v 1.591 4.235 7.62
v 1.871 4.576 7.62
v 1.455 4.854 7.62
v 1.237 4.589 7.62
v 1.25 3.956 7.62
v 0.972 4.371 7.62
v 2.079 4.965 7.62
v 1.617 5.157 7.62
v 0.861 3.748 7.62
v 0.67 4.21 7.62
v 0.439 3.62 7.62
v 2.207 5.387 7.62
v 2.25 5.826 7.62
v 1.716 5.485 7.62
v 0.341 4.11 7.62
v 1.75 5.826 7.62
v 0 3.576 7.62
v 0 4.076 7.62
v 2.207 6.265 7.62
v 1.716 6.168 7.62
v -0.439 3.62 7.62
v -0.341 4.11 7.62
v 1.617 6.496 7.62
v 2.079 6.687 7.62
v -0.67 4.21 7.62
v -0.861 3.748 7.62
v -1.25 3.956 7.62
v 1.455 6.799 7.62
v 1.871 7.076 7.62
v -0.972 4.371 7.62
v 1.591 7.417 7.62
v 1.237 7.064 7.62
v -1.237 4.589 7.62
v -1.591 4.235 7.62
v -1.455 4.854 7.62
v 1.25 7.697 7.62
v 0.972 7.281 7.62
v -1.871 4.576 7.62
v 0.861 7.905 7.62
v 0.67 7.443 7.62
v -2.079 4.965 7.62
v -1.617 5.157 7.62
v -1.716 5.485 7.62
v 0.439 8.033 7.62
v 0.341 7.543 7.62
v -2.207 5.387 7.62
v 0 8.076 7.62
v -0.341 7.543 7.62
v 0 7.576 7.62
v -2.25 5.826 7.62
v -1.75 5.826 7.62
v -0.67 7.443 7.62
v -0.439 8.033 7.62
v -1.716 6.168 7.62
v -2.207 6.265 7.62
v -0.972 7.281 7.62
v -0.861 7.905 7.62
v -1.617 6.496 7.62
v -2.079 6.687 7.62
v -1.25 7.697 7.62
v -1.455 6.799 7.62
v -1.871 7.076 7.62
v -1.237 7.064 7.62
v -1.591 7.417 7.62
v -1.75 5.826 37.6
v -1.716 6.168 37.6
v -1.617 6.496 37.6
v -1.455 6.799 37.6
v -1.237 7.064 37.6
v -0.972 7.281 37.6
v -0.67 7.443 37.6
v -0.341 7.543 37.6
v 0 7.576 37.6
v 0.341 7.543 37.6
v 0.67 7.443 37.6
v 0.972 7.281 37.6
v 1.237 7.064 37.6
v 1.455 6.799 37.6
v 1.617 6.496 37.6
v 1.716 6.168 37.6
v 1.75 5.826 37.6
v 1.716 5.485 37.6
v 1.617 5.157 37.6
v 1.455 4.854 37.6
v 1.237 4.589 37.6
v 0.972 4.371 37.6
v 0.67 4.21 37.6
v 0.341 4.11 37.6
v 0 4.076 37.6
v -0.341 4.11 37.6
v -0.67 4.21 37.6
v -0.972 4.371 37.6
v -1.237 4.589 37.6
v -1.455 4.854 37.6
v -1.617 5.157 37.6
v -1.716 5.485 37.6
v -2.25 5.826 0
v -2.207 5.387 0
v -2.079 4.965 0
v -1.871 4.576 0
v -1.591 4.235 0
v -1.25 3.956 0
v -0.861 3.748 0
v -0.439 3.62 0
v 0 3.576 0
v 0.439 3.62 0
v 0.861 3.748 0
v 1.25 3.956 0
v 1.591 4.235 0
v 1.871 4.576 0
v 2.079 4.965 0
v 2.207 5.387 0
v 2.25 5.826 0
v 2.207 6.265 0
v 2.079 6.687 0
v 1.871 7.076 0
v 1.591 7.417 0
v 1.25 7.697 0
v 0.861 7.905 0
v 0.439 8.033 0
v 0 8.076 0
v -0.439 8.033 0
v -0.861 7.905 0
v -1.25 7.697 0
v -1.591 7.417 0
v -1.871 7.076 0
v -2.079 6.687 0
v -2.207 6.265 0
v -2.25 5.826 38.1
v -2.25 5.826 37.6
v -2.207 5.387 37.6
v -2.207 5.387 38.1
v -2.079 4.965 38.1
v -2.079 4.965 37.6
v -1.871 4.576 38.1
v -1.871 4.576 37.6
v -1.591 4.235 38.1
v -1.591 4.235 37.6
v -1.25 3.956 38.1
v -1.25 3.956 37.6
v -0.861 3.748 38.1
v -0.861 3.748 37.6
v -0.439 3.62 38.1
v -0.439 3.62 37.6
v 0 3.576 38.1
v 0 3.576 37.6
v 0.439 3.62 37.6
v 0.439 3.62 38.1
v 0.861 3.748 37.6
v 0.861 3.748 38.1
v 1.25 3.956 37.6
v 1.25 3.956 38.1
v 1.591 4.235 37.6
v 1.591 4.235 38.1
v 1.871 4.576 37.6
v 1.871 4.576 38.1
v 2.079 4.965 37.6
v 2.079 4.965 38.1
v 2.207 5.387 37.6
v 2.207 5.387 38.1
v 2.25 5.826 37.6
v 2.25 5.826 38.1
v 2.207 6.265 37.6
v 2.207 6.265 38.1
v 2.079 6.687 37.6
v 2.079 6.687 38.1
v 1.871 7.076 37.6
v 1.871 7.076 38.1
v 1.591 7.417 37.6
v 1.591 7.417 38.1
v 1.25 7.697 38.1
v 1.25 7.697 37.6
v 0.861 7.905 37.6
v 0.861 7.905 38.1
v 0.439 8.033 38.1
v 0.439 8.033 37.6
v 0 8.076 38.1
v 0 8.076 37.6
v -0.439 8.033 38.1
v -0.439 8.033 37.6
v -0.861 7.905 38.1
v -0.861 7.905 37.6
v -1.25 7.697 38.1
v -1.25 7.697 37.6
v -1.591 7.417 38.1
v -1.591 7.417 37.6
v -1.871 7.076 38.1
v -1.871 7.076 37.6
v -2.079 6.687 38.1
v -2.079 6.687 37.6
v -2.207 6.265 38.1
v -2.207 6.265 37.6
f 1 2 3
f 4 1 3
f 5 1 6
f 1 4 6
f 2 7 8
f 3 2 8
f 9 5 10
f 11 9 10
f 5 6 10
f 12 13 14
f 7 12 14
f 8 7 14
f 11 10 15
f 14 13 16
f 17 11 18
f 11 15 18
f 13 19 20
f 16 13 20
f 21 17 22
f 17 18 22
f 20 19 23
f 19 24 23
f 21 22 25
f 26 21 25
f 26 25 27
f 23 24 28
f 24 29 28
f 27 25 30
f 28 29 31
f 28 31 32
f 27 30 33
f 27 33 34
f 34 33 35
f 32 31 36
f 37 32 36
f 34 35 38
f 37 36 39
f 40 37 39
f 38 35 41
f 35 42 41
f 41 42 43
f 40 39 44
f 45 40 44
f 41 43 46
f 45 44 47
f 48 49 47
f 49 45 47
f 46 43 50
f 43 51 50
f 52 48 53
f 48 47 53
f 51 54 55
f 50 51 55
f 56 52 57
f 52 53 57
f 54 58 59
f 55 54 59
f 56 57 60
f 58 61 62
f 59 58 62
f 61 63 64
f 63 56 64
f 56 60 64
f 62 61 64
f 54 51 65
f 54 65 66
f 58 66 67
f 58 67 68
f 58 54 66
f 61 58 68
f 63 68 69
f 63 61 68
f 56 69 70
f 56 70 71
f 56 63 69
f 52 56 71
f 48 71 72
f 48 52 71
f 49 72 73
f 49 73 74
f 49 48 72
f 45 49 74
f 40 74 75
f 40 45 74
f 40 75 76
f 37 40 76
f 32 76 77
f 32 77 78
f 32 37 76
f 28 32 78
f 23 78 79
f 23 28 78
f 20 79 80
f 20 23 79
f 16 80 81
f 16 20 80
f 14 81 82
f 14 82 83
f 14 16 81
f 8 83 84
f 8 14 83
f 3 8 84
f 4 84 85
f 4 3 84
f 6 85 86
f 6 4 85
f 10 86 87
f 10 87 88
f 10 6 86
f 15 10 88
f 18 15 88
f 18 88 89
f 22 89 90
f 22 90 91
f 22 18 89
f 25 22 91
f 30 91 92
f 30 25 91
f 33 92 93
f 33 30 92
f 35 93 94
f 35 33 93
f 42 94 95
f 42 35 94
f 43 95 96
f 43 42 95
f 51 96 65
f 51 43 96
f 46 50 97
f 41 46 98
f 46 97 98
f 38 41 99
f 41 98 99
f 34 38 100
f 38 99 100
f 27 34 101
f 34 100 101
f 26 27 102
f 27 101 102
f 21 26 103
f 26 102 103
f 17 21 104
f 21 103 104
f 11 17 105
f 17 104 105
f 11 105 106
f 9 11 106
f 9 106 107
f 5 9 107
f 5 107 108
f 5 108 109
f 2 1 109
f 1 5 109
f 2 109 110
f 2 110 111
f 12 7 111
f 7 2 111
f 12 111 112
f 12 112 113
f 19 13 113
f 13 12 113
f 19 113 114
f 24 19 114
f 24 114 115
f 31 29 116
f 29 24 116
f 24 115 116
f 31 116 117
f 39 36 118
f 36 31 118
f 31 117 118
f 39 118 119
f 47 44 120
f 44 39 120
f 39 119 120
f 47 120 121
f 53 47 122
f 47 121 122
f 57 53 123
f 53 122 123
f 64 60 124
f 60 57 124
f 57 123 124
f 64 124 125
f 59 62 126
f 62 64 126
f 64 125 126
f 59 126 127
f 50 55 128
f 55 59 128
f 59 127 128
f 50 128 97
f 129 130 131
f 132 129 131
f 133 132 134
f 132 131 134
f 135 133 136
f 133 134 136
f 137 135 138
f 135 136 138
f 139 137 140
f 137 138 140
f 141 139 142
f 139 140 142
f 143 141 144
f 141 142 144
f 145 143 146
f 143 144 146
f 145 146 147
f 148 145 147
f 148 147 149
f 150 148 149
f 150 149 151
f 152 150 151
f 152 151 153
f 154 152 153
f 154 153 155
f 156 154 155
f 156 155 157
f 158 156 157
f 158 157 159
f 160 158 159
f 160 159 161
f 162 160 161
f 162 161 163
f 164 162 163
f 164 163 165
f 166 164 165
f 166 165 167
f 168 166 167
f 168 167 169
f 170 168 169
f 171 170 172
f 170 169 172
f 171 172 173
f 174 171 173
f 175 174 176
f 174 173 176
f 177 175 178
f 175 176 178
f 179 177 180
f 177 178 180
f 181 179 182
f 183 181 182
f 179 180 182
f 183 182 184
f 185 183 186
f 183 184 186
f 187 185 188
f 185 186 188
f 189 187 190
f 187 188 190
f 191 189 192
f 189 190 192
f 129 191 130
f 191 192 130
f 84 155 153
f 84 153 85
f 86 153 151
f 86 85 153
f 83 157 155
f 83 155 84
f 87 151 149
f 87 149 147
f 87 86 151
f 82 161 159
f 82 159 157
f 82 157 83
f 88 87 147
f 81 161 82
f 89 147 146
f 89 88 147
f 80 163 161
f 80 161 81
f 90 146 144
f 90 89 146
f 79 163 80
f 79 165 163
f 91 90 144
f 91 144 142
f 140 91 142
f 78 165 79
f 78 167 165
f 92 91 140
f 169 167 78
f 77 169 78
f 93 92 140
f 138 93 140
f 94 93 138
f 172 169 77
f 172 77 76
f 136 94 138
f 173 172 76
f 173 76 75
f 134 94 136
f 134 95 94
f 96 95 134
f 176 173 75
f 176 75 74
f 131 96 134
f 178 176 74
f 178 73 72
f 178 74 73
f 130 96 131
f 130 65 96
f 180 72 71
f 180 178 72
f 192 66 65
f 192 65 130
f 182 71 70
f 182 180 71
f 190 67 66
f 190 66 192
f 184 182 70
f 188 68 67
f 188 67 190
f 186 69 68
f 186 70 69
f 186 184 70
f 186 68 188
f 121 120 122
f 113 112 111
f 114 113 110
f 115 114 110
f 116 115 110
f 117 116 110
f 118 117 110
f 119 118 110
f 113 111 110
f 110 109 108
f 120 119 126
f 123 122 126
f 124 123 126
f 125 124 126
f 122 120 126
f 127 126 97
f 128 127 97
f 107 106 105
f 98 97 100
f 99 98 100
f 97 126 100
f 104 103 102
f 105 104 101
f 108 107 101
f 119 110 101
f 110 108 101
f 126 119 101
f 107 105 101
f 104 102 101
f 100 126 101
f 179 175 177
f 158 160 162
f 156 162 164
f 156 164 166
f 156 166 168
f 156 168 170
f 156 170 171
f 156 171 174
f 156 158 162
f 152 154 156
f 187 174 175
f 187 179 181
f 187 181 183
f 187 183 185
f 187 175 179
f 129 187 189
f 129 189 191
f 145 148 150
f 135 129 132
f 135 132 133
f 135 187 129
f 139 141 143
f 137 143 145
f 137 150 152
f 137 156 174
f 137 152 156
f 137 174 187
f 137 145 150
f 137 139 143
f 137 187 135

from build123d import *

# Parameters (mm, degrees)
SKETCH1_R           = 2.25
BOSS_EXTRUDE1_DEPTH = 38.1
CUT_EXTRUDE1_START  = -7.62
SKETCH3_OUTSIDE_W   = 14.226
SKETCH3_OUTSIDE_H   = 14.226
SKETCH3_OUTSIDE_R   = 1.75
CUT_EXTRUDE1_DEPTH  = 29.98


with BuildPart() as part:
    # Sketch1 → Boss-Extrude1 (new body)
    with BuildSketch(Plane.XY):
        with Locations(Location((0, 5.826393973, 0), (0, 0, 180))):
            Circle(SKETCH1_R)
    extrude(amount=BOSS_EXTRUDE1_DEPTH)

    # Sketch3 outside → Cut-Extrude1 (cut)
    with BuildSketch(Plane(origin=(0, 0, 0), x_dir=(-1, 0, 0), z_dir=(0, 0, -1)).offset(CUT_EXTRUDE1_START)):
        with Locations((0, 5.826)):
            Rectangle(SKETCH3_OUTSIDE_W, SKETCH3_OUTSIDE_H)
        with Locations((0, 5.826393973)):
            Circle(SKETCH3_OUTSIDE_R, mode=Mode.SUBTRACT)
    extrude(amount=-CUT_EXTRUDE1_DEPTH, mode=Mode.SUBTRACT)


solid = part.part
